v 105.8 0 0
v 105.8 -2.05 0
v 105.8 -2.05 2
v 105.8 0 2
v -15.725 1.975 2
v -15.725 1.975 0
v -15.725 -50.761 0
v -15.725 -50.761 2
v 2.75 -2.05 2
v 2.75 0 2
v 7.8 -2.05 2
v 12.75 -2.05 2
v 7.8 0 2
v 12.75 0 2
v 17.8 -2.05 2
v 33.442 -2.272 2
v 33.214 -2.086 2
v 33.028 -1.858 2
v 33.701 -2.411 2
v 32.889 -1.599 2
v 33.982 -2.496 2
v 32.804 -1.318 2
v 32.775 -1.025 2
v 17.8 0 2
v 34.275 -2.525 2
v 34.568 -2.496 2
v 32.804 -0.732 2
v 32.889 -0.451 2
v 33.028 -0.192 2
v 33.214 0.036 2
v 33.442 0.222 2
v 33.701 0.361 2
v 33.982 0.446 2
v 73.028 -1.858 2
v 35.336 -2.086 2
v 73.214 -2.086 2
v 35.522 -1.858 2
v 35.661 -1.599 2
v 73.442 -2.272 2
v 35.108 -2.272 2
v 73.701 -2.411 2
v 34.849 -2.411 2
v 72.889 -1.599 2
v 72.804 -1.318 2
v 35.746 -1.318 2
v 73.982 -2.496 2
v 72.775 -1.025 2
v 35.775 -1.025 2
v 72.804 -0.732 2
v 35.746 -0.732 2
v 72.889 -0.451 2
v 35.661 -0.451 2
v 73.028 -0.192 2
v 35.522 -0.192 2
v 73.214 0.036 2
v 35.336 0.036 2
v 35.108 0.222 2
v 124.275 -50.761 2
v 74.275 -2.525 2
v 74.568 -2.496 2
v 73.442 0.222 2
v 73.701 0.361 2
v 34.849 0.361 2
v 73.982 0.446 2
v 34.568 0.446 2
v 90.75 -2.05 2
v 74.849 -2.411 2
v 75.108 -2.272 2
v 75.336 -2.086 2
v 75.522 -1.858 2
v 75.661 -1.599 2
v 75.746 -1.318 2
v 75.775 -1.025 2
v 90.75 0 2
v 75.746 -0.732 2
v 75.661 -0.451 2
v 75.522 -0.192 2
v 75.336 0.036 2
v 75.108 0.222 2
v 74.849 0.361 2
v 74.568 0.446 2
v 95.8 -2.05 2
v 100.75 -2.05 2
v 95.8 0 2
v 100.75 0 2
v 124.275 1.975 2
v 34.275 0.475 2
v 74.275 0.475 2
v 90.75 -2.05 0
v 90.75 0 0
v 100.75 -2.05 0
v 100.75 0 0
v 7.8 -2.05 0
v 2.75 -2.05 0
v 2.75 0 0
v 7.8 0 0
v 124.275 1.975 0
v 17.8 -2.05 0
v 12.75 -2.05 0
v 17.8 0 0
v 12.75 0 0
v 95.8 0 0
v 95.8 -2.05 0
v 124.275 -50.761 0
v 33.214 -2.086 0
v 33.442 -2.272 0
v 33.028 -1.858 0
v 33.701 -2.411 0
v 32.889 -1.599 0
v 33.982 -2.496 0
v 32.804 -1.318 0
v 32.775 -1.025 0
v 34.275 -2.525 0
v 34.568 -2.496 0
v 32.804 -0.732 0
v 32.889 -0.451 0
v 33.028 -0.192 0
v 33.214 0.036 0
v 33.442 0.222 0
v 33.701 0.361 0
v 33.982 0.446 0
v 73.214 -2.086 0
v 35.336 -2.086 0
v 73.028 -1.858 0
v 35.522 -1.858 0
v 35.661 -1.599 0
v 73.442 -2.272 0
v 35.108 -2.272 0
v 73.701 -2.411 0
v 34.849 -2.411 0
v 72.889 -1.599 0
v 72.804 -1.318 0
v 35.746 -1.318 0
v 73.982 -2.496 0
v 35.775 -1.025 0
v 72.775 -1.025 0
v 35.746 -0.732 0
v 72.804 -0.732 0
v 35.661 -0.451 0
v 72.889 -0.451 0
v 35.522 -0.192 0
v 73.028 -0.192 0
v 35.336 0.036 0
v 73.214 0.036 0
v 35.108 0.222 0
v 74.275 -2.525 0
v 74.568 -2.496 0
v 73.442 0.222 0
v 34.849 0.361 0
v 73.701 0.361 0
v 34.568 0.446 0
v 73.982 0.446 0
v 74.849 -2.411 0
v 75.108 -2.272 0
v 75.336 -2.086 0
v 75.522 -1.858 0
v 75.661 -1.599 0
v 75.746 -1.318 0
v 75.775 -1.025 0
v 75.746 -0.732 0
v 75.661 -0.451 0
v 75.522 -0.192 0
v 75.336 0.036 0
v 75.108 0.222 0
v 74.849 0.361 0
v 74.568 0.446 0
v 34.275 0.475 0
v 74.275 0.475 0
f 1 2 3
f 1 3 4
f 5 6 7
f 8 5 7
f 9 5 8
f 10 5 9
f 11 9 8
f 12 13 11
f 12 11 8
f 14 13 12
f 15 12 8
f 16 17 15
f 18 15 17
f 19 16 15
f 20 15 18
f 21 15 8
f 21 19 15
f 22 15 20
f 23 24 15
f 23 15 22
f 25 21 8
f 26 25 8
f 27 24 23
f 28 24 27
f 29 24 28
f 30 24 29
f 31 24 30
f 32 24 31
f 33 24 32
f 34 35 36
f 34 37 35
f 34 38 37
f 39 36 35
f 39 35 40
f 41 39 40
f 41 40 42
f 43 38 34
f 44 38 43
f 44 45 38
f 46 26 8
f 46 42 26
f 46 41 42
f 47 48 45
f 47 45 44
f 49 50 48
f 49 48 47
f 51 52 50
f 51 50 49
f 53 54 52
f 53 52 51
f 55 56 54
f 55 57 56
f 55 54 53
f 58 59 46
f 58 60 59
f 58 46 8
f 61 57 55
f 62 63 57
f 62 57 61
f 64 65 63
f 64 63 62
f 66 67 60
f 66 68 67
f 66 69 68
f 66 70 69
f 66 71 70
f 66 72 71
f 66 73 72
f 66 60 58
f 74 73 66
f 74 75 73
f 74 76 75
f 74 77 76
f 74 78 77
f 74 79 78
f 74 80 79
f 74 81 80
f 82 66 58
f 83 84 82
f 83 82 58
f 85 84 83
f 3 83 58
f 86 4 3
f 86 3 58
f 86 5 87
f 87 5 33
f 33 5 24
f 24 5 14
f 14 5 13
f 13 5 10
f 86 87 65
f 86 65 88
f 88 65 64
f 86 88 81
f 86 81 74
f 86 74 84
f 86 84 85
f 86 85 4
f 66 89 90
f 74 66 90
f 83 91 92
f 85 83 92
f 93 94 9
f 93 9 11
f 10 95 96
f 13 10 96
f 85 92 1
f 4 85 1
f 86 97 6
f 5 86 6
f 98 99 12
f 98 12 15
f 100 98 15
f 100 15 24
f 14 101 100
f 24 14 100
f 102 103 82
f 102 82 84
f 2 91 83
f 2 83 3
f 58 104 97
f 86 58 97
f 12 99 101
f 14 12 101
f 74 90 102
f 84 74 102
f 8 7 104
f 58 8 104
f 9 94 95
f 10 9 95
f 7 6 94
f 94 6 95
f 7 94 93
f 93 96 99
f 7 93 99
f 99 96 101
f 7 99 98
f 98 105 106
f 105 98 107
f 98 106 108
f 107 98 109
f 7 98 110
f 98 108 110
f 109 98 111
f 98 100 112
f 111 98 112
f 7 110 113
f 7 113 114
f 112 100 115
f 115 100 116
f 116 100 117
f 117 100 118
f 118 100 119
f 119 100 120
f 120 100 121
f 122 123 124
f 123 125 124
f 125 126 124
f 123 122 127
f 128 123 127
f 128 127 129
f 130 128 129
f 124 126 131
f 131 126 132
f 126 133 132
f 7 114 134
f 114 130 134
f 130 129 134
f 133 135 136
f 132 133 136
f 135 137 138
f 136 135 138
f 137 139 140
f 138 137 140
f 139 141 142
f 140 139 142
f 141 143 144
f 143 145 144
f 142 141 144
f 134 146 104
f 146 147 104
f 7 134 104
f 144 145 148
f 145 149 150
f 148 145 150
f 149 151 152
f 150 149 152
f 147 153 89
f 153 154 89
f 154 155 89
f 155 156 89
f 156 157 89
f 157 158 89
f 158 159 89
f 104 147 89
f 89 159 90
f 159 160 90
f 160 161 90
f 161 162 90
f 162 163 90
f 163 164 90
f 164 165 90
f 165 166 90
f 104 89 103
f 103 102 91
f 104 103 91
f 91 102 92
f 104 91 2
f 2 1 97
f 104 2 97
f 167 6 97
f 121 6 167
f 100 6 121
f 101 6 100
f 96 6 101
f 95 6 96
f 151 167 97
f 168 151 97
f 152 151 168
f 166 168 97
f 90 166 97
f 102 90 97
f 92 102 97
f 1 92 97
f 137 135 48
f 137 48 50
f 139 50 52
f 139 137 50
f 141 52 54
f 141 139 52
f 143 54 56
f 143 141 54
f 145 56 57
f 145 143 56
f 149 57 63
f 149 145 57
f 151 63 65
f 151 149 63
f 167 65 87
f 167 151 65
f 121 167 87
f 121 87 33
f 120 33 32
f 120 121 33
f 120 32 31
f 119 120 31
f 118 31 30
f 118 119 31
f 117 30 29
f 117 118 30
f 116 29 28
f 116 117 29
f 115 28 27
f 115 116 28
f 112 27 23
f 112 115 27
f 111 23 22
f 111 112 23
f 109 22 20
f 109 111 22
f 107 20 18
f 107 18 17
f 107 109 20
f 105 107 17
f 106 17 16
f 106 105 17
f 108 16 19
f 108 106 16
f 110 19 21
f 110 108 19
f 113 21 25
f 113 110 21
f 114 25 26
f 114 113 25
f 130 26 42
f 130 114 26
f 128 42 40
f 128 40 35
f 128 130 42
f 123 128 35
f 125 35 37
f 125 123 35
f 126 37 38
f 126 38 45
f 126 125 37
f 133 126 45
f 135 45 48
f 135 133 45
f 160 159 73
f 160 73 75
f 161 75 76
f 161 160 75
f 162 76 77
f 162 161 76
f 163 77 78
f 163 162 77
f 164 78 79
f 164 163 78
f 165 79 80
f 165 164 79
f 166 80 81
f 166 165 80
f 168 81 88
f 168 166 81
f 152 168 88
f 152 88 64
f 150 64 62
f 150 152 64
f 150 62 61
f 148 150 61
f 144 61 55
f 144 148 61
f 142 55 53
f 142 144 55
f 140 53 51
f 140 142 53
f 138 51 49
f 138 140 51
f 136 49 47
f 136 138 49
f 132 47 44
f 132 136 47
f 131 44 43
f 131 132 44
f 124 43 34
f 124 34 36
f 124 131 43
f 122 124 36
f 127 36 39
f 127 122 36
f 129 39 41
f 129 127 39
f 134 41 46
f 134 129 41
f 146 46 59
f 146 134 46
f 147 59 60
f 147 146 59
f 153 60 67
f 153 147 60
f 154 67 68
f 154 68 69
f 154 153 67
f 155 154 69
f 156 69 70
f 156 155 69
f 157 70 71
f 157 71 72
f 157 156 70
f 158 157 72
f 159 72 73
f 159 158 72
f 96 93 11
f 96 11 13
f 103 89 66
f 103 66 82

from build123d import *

# Parameters (mm, degrees)
SKETCH_1_R      = 1.5
SKETCH_1_W      = 5.05
SKETCH_1_H      = 2.05
EXTRUDE_1_DEPTH = 2


with BuildPart() as part:
    # 草图1 → 凸台-拉伸1 (new body)
    with BuildSketch(Plane.XY):
        Polygon((54.275, 1.975), (-15.725, 1.975), (-15.725, -50.760914608), (124.275, -50.760914608), (124.275, 1.975), align=None)
        with Locations((34.275, -1.025)):
            Circle(SKETCH_1_R, mode=Mode.SUBTRACT)
        with Locations((74.275, -1.025)):
            Circle(SKETCH_1_R, mode=Mode.SUBTRACT)
        with Locations((15.275, -1.025)):
            Rectangle(SKETCH_1_W, SKETCH_1_H, mode=Mode.SUBTRACT)
        with Locations((5.275, -1.025)):
            Rectangle(SKETCH_1_W, SKETCH_1_H, mode=Mode.SUBTRACT)
        with Locations((103.275, -1.025)):
            Rectangle(SKETCH_1_W, SKETCH_1_H, mode=Mode.SUBTRACT)
        with Locations((93.275, -1.025)):
            Rectangle(SKETCH_1_W, SKETCH_1_H, mode=Mode.SUBTRACT)
    extrude(amount=EXTRUDE_1_DEPTH)


solid = part.part
